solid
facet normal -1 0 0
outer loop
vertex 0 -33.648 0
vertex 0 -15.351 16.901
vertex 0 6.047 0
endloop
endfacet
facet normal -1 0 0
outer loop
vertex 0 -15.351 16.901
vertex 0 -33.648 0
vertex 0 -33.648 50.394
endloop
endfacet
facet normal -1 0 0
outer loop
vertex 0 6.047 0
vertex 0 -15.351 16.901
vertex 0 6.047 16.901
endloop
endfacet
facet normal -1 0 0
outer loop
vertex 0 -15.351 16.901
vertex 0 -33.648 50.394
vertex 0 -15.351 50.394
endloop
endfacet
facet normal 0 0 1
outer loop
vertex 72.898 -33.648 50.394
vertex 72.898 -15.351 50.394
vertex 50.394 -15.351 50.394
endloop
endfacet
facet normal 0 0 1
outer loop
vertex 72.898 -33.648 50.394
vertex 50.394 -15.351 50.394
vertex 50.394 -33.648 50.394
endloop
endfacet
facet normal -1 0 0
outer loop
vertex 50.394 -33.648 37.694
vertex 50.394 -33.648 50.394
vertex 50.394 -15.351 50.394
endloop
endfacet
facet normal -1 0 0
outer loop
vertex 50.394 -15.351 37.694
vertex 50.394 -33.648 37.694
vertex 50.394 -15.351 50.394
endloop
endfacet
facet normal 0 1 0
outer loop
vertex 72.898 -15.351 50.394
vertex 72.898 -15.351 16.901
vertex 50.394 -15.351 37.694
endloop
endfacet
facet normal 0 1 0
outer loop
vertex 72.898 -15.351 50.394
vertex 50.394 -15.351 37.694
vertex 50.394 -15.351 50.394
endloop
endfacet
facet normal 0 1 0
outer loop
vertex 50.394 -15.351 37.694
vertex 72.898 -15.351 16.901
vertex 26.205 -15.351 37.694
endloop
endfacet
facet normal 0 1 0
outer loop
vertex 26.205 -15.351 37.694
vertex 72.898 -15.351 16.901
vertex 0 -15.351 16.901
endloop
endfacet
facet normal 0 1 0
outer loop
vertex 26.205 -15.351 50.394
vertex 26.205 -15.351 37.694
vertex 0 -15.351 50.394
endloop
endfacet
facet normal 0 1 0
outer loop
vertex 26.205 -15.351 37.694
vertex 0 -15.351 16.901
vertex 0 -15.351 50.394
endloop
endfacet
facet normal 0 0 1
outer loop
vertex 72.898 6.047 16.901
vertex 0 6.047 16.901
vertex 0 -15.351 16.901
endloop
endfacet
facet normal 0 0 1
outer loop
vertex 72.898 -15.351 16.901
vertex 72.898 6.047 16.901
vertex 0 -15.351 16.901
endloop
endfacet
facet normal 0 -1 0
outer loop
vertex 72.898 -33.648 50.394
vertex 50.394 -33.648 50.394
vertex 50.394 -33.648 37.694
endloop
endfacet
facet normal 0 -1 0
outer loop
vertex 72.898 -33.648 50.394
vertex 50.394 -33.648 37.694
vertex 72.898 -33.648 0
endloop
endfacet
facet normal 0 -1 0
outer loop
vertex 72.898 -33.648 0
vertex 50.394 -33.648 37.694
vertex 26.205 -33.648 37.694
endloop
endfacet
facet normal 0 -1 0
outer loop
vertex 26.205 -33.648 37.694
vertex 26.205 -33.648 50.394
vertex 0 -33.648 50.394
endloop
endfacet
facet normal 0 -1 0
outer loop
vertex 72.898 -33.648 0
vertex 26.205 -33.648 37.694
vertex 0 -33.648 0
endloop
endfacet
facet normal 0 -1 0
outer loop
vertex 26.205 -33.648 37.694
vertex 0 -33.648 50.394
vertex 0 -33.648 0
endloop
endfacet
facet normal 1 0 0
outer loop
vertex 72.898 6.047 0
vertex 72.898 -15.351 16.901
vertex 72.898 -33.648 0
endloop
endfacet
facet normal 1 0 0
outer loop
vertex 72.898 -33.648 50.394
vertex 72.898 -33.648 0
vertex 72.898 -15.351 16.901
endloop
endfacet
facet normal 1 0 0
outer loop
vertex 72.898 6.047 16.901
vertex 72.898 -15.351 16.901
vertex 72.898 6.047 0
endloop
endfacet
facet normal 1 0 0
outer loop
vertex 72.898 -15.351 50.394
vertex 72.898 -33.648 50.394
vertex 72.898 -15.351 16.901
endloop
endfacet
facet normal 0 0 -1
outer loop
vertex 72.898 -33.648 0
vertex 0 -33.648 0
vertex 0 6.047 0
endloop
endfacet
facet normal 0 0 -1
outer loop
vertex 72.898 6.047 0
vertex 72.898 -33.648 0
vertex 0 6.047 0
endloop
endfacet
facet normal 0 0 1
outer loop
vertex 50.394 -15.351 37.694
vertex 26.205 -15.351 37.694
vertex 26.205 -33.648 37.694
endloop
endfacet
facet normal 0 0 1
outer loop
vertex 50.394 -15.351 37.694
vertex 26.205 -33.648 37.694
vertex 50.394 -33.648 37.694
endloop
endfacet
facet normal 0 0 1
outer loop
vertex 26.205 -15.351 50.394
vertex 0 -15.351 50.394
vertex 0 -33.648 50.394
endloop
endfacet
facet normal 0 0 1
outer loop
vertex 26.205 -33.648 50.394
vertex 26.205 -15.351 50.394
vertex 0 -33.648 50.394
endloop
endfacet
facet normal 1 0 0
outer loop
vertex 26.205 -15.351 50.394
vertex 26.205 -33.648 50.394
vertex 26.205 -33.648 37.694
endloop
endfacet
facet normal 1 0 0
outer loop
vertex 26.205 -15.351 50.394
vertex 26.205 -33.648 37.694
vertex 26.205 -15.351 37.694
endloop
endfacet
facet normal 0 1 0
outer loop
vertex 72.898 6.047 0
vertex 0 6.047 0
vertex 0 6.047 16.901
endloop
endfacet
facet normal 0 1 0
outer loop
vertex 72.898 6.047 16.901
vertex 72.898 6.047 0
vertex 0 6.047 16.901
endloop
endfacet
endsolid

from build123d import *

# Parameters (mm, degrees)
F1_DEPTH = 72.898
F2_W     = 24.1890717298
F2_H     = 18.2968638837
F3_DEPTH = 12.7


# Not quite as in the source:
# - a length typed as a fraction of an inch, garbled in the dataset ("3 / 203.2 mm" for 3/8 in), is restored


with BuildPart() as f1:
    # F0 (on Right) → F1 (new body)
    with BuildSketch(Plane.YZ):
        Polygon((-3.8764555939, 0), (0, 0), (6.0472693294, 0), (6.0472693294, 16.9013366103), (-15.3507553041, 16.9013366103), (-15.3507553041, 50.3938943148), (-33.6476191878, 50.3938943148), (-33.6476191878, 0), align=None)
    extrude(amount=F1_DEPTH)

    # F2 (on face) → F3 (cut)
    with BuildSketch(Plane.XY.offset(50.3938943148)):
        with Locations((38.2993584499, -24.499187246)):
            Rectangle(F2_W, F2_H)
    extrude(amount=-F3_DEPTH, mode=Mode.SUBTRACT)


solid = f1.part
